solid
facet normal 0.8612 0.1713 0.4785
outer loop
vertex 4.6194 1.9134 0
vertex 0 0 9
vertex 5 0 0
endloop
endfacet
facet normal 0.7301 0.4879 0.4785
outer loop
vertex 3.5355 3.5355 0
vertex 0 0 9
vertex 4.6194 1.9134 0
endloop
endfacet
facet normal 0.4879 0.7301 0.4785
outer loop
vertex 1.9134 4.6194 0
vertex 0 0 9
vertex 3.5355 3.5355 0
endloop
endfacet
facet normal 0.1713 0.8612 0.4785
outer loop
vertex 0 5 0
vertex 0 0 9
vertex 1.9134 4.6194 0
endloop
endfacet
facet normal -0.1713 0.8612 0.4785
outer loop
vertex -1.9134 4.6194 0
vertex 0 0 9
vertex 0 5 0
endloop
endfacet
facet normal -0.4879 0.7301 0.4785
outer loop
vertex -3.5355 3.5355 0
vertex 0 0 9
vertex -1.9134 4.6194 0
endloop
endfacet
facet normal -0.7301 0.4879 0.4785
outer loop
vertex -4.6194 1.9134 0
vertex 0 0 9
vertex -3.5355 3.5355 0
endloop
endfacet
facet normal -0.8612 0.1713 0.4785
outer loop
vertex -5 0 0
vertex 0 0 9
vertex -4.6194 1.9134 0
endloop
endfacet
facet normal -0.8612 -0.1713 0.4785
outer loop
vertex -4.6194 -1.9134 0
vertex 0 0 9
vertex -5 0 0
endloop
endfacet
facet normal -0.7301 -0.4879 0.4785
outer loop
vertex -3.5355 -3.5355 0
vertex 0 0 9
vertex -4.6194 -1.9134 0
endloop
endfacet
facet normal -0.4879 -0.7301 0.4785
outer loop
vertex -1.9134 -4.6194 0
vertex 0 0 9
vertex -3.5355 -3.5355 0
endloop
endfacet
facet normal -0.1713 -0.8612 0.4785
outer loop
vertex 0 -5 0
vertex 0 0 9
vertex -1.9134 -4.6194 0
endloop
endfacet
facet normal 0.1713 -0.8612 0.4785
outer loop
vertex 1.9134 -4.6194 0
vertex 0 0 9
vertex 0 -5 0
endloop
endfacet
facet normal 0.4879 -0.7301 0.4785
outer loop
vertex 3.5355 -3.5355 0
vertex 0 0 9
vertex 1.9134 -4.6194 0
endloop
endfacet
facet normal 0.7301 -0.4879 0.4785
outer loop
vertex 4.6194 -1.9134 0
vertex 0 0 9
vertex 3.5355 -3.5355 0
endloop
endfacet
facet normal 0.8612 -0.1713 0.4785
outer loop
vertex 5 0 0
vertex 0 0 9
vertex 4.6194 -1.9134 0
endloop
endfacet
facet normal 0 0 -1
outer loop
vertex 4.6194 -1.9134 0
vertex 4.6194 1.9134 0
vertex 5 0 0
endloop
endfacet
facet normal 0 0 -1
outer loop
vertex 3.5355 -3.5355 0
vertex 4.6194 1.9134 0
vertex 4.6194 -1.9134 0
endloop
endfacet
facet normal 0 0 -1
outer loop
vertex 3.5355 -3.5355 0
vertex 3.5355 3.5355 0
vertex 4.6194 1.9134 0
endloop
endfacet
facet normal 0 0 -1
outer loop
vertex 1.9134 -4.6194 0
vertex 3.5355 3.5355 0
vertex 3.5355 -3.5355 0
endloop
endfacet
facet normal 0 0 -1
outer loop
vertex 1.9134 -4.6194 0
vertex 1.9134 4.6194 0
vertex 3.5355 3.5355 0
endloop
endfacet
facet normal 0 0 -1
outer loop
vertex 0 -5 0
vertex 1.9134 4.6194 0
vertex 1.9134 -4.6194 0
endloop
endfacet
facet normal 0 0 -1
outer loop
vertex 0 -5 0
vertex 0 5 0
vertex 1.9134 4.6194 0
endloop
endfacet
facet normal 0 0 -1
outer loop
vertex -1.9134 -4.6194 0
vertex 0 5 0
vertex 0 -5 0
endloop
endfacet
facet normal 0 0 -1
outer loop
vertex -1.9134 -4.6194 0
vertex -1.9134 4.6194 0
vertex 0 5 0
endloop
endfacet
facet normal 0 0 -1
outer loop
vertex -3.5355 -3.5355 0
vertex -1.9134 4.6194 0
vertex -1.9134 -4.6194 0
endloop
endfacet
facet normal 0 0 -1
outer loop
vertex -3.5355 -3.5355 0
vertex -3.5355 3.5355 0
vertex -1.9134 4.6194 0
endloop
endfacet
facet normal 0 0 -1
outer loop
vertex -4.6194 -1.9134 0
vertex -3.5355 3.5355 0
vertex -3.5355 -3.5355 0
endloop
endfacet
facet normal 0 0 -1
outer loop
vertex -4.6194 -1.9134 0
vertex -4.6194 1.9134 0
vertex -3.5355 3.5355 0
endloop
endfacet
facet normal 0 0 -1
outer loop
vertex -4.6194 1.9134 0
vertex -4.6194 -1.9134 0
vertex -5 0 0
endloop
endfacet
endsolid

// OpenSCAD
// Generated by SolidPython 1.0.1 on 2020-07-29 00:46:43


cylinder(h = 9, r1 = 5, r2 = 0);
/***********************************************
*********      SolidPython code:      **********
************************************************
 
# import packages: SolidPython
from solid import *
from solid.utils import *
from itertools import chain, combinations, permutations


class Resize:

    def __init__(self, scad_file):
        self.scad_file = scad_file
        #self.scad_file = import_scad(scad_file)
        # cone/cylinder param:
        self.r1 = 0
        self.r2 = 0
        self.h = 0
        # rectangular prism param:
        self.w = 0
        self.l = 0
        # ellipse param:
        self.r = 0

    # import OpenScad code (file name corresponds to shape)


    # classify shape + parameters
    def assign(self, param1, param2, param3):
        if self.scad_file == 'cone.scad':
            self.r1 = param1
            self.r2 = param2
            self.h = param3
        elif self.scad_file == 'cylinder.scad':
            self.r1 = param1
            self.r2 = param2
            self.h = param3
        elif self.scad_file == 'rectangularPrism.scad':
            self.h = param1
            self.l = param2
            self.w = param3
        else:
            self.r = param1
            self.h = param2

    # resize parameters
    def iterate(self):
        x = range(3, 20, 2)
        i = 1
        if self.scad_file == 'cone.scad':
            tempList = list(permutations(x, 2))
            for temp in tempList:
                param1 = temp[0]
                param2 = temp[1]
                filepath = 'produced_scad_files/' + 'cone' + str(param1) + '_' + str(param2) + '_' + '.scad'
                scad_render_to_file(cylinder(h=param1, r1=param2, r2=0), filepath)

        elif self.scad_file == 'cylinder.scad':
            tempList = list(permutations(x, 3))
            for temp in tempList:
                param1 = temp[0]
                param2 = temp[1]
                filepath = 'produced_scad_files/' + 'cylinder' + str(param1) + '_' + str(param2) + '_' + '.scad'
                scad_render_to_file(cylinder(h=param1, r1=param2, r2=param2), filepath)

        elif self.scad_file == 'rectangularPrism.scad':
            tempList = list(permutations(x, 3))
            for temp in tempList:
                param1 = temp[0]
                param2 = temp[1]
                param3 = temp[2]
                filepath = 'produced_scad_files/' + 'rectangularPrism' + str(param1) + '_' + str(param2) + '_' + str(
                    param3) + '.scad'
                scad_render_to_file(cube(size=(param1, param2, param3)), filepath)

        elif self.scad_file == 'ellipse.scad':
            tempList = list(permutations(x, 4))
            for temp in tempList:
                param1 = temp[0]
                param2 = temp[1]
                param3 = temp[2]
                param4 = temp[3]
                filepath = 'produced_scad_files/' + 'ellipse' + str(param1) + '_' + str(param2) + '_' + str(param3) + '_' + str(param4) + '.scad'
                scad_render_to_file(scale([param1, param2, param3])(sphere(r=param4)), filepath)

    def render_to_scadfile(self):
        scad_render_to_file(scad, 'example.scad') 
 
************************************************/
